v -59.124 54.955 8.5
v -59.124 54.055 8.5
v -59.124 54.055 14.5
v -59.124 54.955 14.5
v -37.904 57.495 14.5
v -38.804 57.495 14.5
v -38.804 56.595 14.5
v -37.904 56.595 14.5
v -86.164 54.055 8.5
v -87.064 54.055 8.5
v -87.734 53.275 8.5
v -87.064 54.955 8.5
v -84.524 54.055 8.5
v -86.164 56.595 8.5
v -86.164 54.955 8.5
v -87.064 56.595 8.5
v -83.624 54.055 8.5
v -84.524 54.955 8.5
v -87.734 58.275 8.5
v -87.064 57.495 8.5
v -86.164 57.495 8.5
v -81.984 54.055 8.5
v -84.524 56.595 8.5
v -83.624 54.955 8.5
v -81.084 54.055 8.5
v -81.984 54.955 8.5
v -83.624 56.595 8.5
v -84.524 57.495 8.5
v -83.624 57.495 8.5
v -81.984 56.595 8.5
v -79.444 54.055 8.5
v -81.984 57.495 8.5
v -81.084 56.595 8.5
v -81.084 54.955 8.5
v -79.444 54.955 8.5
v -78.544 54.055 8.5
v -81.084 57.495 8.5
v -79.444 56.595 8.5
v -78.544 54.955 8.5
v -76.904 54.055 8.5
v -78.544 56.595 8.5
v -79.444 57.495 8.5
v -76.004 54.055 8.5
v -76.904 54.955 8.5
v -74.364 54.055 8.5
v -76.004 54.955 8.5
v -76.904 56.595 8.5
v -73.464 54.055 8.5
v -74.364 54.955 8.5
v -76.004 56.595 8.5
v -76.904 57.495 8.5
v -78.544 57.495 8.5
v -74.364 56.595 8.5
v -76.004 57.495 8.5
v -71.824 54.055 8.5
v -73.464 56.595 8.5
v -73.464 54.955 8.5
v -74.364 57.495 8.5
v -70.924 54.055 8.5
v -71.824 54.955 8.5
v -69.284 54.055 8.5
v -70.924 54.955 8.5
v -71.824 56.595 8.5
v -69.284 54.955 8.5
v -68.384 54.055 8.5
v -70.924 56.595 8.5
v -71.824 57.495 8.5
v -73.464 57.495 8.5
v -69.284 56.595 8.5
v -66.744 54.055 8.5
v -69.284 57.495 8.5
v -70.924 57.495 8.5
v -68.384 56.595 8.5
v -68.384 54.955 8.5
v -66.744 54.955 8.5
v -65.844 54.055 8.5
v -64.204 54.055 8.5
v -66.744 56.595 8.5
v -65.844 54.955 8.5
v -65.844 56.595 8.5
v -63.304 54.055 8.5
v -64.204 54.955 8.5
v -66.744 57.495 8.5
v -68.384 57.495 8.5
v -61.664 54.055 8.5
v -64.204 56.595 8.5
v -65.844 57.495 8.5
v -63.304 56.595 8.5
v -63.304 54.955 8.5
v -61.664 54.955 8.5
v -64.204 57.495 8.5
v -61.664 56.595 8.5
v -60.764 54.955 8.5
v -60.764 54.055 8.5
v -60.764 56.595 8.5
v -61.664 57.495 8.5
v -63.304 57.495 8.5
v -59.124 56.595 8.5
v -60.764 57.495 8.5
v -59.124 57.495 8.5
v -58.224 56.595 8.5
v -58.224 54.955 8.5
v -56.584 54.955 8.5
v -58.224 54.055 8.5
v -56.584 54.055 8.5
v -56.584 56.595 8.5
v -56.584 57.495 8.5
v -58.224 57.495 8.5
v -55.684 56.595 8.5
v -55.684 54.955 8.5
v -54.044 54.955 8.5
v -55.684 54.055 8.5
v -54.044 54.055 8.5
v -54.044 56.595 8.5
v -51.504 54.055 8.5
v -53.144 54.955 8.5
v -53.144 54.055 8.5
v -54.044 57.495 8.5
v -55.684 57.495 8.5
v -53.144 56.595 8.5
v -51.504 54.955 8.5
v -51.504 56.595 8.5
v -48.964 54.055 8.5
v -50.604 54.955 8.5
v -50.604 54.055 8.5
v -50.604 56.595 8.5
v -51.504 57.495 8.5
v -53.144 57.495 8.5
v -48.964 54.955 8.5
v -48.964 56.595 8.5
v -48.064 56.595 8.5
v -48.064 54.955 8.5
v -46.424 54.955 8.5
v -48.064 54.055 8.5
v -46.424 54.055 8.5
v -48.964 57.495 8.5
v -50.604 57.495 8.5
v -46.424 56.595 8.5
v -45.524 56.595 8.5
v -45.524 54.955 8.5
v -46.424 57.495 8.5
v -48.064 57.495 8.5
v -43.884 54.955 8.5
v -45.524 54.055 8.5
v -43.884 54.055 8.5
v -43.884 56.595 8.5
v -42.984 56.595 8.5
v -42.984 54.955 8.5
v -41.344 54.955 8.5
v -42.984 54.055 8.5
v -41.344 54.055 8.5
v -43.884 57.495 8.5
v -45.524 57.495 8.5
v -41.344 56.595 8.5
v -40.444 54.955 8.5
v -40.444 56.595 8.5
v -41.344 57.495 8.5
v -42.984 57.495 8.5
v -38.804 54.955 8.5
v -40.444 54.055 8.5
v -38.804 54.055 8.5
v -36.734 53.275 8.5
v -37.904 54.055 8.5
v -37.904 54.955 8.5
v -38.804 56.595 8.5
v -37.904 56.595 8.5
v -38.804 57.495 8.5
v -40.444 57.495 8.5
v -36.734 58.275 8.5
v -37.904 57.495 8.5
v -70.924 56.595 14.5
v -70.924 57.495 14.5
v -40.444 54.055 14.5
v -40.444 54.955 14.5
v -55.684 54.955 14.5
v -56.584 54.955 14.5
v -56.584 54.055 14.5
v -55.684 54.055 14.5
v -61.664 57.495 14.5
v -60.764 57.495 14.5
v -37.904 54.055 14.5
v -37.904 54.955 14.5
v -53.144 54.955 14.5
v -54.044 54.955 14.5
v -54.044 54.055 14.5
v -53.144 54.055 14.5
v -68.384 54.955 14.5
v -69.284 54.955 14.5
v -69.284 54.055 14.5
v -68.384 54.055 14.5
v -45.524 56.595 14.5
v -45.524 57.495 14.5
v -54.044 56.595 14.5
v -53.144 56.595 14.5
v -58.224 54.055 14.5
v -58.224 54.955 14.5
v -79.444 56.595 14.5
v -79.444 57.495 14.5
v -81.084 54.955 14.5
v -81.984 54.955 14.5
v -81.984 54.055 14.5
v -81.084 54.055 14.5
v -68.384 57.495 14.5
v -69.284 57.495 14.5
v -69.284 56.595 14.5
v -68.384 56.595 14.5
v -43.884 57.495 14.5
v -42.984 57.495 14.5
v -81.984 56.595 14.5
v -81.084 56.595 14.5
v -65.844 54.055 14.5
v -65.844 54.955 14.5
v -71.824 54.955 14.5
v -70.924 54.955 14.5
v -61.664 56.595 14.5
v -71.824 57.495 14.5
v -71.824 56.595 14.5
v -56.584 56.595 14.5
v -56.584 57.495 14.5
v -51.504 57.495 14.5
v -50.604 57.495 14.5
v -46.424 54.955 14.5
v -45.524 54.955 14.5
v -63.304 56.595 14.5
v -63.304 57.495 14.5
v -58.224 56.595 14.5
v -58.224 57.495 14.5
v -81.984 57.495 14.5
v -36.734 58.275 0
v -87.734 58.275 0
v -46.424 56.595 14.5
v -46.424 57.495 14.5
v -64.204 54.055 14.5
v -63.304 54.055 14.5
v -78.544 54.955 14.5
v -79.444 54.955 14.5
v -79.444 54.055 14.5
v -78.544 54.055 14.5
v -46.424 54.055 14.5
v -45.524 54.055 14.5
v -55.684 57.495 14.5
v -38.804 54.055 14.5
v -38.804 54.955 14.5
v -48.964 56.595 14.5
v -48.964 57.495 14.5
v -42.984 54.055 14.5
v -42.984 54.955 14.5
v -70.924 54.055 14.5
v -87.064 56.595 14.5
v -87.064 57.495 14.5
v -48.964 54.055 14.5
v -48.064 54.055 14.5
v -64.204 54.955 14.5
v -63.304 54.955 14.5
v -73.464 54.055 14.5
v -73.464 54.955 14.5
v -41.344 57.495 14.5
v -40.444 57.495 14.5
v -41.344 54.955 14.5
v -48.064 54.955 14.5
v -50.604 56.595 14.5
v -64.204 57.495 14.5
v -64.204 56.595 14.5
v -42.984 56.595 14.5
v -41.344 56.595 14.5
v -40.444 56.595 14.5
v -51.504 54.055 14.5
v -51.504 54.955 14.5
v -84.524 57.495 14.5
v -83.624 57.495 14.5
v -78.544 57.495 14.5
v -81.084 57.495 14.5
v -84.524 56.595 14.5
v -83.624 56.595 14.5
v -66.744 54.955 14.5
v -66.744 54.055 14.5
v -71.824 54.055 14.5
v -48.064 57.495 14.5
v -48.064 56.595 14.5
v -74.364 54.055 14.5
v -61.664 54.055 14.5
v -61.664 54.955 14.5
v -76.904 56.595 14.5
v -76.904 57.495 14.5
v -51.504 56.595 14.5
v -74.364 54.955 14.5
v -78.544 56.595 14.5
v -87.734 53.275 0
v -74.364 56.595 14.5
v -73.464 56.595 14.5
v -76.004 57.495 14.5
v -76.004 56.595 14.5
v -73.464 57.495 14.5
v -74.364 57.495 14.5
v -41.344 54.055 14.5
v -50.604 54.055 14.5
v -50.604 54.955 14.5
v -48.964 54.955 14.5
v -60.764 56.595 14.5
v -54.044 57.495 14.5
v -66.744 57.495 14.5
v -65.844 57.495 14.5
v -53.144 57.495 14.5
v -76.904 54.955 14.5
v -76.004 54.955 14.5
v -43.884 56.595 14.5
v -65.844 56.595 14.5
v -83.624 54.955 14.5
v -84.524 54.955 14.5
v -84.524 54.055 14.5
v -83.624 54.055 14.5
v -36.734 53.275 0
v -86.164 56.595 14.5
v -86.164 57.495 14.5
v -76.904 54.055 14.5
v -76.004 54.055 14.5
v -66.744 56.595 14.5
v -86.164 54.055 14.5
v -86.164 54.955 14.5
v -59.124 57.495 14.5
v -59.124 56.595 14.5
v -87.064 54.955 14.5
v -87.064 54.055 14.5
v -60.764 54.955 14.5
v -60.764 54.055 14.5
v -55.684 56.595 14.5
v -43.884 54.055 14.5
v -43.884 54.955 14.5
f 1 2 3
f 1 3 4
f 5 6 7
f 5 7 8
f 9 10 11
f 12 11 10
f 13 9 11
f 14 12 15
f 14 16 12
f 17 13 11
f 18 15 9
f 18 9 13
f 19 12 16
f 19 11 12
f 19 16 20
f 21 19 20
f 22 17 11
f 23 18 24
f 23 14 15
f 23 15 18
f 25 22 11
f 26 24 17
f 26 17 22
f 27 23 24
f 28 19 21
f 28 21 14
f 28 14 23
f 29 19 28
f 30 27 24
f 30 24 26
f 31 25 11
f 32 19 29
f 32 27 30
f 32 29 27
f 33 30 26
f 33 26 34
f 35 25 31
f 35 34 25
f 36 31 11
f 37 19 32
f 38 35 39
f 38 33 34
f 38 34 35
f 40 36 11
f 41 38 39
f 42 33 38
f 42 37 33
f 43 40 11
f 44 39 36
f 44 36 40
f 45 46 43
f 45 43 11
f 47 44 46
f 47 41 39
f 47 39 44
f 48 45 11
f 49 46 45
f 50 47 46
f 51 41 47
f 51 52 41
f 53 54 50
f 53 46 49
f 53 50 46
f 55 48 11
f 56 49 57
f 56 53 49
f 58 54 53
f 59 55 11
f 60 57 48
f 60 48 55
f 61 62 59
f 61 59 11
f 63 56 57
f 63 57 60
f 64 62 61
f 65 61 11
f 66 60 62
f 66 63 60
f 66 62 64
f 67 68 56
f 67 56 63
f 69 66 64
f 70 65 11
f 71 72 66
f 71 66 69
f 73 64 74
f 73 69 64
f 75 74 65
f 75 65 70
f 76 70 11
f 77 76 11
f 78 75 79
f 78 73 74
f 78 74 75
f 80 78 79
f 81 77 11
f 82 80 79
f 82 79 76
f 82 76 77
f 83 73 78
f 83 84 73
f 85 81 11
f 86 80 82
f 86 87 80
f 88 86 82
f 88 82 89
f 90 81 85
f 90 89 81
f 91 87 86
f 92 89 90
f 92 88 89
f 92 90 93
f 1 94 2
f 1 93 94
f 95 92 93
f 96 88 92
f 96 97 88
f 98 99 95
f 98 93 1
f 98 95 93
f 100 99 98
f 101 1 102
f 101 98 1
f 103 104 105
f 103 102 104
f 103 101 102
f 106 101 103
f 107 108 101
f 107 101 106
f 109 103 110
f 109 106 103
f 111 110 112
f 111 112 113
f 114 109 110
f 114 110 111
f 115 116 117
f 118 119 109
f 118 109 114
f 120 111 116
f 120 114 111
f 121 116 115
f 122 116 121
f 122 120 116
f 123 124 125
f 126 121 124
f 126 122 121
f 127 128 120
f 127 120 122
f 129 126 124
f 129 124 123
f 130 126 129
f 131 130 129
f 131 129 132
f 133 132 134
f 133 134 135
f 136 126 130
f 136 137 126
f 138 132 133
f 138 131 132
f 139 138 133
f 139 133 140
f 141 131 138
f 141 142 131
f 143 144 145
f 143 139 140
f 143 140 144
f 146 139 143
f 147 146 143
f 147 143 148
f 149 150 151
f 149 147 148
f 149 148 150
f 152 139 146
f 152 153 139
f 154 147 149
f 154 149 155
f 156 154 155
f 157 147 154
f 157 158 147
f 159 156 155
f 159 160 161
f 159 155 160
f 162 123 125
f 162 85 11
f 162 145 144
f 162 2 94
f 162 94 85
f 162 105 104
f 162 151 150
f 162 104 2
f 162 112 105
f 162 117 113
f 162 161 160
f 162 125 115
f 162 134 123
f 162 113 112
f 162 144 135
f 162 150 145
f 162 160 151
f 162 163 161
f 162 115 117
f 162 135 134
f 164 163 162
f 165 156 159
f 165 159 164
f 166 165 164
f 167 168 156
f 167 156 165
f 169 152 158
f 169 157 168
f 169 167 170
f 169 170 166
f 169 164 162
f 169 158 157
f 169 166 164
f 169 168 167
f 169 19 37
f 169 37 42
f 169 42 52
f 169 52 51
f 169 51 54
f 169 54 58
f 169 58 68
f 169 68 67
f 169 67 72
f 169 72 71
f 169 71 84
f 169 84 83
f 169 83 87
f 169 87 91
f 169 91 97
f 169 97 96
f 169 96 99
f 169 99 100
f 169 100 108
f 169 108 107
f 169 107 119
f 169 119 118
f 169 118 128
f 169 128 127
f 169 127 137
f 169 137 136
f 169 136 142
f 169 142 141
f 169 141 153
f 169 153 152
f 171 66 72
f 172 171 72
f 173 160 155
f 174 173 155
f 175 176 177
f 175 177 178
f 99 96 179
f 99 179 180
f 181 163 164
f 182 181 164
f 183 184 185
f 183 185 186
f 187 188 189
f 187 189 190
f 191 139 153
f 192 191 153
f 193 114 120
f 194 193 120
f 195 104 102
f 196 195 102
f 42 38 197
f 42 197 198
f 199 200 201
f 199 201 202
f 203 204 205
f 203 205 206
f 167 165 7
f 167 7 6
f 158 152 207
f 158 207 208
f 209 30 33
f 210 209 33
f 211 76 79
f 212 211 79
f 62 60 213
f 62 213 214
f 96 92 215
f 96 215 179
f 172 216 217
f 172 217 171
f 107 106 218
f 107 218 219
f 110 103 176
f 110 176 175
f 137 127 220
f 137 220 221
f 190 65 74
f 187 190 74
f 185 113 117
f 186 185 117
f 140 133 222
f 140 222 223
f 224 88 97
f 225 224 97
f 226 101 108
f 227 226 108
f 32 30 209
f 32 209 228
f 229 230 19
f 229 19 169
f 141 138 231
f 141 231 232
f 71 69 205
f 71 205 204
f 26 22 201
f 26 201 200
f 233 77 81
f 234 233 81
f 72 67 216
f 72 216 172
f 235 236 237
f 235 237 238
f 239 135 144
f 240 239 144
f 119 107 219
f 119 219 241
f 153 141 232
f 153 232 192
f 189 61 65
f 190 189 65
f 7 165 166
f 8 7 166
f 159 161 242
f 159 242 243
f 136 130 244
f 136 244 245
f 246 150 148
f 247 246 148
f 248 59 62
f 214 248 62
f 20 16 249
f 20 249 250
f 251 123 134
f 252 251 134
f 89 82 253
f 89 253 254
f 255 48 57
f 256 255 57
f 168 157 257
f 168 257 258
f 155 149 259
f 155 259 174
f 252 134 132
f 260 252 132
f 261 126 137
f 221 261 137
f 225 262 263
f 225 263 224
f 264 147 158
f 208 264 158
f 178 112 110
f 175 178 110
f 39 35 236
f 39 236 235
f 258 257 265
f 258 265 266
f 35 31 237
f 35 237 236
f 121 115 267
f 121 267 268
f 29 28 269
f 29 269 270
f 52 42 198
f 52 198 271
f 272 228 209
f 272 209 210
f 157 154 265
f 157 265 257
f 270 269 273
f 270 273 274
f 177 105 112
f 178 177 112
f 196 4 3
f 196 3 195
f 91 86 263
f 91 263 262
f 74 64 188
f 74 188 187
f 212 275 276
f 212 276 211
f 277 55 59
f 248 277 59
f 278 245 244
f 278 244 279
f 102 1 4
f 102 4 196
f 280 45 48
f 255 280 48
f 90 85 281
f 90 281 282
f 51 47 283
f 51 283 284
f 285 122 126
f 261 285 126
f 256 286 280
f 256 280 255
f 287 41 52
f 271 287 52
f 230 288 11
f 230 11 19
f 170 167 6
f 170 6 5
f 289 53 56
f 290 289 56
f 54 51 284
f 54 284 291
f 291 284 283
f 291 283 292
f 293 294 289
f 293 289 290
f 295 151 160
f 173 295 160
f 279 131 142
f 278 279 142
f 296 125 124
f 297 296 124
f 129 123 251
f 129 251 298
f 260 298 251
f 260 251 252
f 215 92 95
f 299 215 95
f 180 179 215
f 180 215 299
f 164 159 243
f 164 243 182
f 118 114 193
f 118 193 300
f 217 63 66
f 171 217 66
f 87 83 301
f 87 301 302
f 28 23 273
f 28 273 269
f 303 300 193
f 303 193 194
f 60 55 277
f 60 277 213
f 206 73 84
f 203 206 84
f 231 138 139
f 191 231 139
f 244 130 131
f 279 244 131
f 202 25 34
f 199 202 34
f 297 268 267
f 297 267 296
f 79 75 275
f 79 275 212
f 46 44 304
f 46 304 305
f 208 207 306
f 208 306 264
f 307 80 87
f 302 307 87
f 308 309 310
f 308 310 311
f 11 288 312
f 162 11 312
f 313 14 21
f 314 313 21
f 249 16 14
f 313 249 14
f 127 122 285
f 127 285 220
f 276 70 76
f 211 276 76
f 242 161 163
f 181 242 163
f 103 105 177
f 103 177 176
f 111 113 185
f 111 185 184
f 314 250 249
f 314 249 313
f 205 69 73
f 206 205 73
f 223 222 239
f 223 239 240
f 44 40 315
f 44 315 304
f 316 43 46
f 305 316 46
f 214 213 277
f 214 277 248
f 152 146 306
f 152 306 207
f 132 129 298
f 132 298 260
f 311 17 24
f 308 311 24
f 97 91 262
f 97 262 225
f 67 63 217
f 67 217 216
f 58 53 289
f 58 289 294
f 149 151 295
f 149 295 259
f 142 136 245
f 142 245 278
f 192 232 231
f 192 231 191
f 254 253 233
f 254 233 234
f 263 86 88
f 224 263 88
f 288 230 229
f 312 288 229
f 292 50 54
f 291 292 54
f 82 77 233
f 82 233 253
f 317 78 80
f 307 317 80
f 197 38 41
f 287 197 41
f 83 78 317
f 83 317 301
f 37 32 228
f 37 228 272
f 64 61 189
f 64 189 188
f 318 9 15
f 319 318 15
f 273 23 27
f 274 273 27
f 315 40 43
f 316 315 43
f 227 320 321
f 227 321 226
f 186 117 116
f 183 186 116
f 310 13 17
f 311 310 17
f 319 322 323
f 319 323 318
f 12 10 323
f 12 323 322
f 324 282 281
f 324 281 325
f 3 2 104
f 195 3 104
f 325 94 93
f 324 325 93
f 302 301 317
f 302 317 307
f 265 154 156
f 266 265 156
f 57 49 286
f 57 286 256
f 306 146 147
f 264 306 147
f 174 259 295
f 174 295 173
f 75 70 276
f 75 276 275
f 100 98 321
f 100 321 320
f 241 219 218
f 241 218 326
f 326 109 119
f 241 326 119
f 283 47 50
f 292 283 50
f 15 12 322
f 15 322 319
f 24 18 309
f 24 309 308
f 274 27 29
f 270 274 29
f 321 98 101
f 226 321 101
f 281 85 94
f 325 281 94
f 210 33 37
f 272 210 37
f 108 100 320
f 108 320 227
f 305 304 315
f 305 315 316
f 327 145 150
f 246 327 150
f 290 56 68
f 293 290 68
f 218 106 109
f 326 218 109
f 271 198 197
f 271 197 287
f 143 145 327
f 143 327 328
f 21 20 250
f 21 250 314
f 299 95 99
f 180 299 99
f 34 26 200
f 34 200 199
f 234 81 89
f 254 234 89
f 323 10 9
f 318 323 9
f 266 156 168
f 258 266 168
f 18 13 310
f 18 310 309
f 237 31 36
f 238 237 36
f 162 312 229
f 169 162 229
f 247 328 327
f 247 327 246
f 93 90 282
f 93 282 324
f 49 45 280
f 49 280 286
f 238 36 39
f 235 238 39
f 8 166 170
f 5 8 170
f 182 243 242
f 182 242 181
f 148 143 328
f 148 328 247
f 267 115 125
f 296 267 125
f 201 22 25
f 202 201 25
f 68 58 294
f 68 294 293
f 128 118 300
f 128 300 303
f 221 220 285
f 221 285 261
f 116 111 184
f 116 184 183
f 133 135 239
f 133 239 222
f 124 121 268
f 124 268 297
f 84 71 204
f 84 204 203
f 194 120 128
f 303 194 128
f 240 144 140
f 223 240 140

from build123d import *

# Parameters (mm, degrees)
SKETCH_1_W      = 51
SKETCH_1_H      = 5
EXTRUDE_1_DEPTH = 8.5
SKETCH_3_W      = 0.9
SKETCH_3_H      = 0.9
EXTRUDE_2_DEPTH = 6


with BuildPart() as part:
    # 草图1 → 凸台-拉伸1 (new body)
    with BuildSketch(Plane.XY):
        with Locations((-62.234353046, 55.774690545)):
            Rectangle(SKETCH_1_W, SKETCH_1_H)
    extrude(amount=EXTRUDE_1_DEPTH)

    # 草图3 → 凸台-拉伸2 (add)
    with BuildSketch(Plane.XY.offset(8.5)):
        with Locations((-84.074353046, 57.044690545)):
            Rectangle(SKETCH_3_W, SKETCH_3_H)
        with Locations((-86.614353046, 57.044690545)):
            Rectangle(SKETCH_3_W, SKETCH_3_H)
        with Locations((-81.534353046, 57.044690545)):
            Rectangle(SKETCH_3_W, SKETCH_3_H)
        with Locations((-78.994353046, 57.044690545)):
            Rectangle(SKETCH_3_W, SKETCH_3_H)
        with Locations((-76.454353046, 57.044690545)):
            Rectangle(SKETCH_3_W, SKETCH_3_H)
        with Locations((-73.914353046, 57.044690545)):
            Rectangle(SKETCH_3_W, SKETCH_3_H)
        with Locations((-71.374353046, 57.044690545)):
            Rectangle(SKETCH_3_W, SKETCH_3_H)
        with Locations((-68.834353046, 57.044690545)):
            Rectangle(SKETCH_3_W, SKETCH_3_H)
        with Locations((-66.294353046, 57.044690545)):
            Rectangle(SKETCH_3_W, SKETCH_3_H)
        with Locations((-63.754353046, 57.044690545)):
            Rectangle(SKETCH_3_W, SKETCH_3_H)
        with Locations((-61.214353046, 57.044690545)):
            Rectangle(SKETCH_3_W, SKETCH_3_H)
        with Locations((-58.674353046, 57.044690545)):
            Rectangle(SKETCH_3_W, SKETCH_3_H)
        with Locations((-56.134353046, 57.044690545)):
            Rectangle(SKETCH_3_W, SKETCH_3_H)
        with Locations((-53.594353046, 57.044690545)):
            Rectangle(SKETCH_3_W, SKETCH_3_H)
        with Locations((-51.054353046, 57.044690545)):
            Rectangle(SKETCH_3_W, SKETCH_3_H)
        with Locations((-48.514353046, 57.044690545)):
            Rectangle(SKETCH_3_W, SKETCH_3_H)
        with Locations((-45.974353046, 57.044690545)):
            Rectangle(SKETCH_3_W, SKETCH_3_H)
        with Locations((-43.434353046, 57.044690545)):
            Rectangle(SKETCH_3_W, SKETCH_3_H)
        with Locations((-40.894353046, 57.044690545)):
            Rectangle(SKETCH_3_W, SKETCH_3_H)
        with Locations((-38.354353046, 57.044690545)):
            Rectangle(SKETCH_3_W, SKETCH_3_H)
        with Locations((-84.074353046, 54.504690545)):
            Rectangle(SKETCH_3_W, SKETCH_3_H)
        with Locations((-81.534353046, 54.504690545)):
            Rectangle(SKETCH_3_W, SKETCH_3_H)
        with Locations((-78.994353046, 54.504690545)):
            Rectangle(SKETCH_3_W, SKETCH_3_H)
        with Locations((-76.454353046, 54.504690545)):
            Rectangle(SKETCH_3_W, SKETCH_3_H)
        with Locations((-73.914353046, 54.504690545)):
            Rectangle(SKETCH_3_W, SKETCH_3_H)
        with Locations((-71.374353046, 54.504690545)):
            Rectangle(SKETCH_3_W, SKETCH_3_H)
        with Locations((-68.834353046, 54.504690545)):
            Rectangle(SKETCH_3_W, SKETCH_3_H)
        with Locations((-66.294353046, 54.504690545)):
            Rectangle(SKETCH_3_W, SKETCH_3_H)
        with Locations((-63.754353046, 54.504690545)):
            Rectangle(SKETCH_3_W, SKETCH_3_H)
        with Locations((-61.214353046, 54.504690545)):
            Rectangle(SKETCH_3_W, SKETCH_3_H)
        with Locations((-58.674353046, 54.504690545)):
            Rectangle(SKETCH_3_W, SKETCH_3_H)
        with Locations((-56.134353046, 54.504690545)):
            Rectangle(SKETCH_3_W, SKETCH_3_H)
        with Locations((-53.594353046, 54.504690545)):
            Rectangle(SKETCH_3_W, SKETCH_3_H)
        with Locations((-51.054353046, 54.504690545)):
            Rectangle(SKETCH_3_W, SKETCH_3_H)
        with Locations((-48.514353046, 54.504690545)):
            Rectangle(SKETCH_3_W, SKETCH_3_H)
        with Locations((-45.974353046, 54.504690545)):
            Rectangle(SKETCH_3_W, SKETCH_3_H)
        with Locations((-43.434353046, 54.504690545)):
            Rectangle(SKETCH_3_W, SKETCH_3_H)
        with Locations((-40.894353046, 54.504690545)):
            Rectangle(SKETCH_3_W, SKETCH_3_H)
        with Locations((-38.354353046, 54.504690545)):
            Rectangle(SKETCH_3_W, SKETCH_3_H)
        with Locations((-86.614353046, 54.504690545)):
            Rectangle(SKETCH_3_W, SKETCH_3_H)
    extrude(amount=EXTRUDE_2_DEPTH)


solid = part.part
